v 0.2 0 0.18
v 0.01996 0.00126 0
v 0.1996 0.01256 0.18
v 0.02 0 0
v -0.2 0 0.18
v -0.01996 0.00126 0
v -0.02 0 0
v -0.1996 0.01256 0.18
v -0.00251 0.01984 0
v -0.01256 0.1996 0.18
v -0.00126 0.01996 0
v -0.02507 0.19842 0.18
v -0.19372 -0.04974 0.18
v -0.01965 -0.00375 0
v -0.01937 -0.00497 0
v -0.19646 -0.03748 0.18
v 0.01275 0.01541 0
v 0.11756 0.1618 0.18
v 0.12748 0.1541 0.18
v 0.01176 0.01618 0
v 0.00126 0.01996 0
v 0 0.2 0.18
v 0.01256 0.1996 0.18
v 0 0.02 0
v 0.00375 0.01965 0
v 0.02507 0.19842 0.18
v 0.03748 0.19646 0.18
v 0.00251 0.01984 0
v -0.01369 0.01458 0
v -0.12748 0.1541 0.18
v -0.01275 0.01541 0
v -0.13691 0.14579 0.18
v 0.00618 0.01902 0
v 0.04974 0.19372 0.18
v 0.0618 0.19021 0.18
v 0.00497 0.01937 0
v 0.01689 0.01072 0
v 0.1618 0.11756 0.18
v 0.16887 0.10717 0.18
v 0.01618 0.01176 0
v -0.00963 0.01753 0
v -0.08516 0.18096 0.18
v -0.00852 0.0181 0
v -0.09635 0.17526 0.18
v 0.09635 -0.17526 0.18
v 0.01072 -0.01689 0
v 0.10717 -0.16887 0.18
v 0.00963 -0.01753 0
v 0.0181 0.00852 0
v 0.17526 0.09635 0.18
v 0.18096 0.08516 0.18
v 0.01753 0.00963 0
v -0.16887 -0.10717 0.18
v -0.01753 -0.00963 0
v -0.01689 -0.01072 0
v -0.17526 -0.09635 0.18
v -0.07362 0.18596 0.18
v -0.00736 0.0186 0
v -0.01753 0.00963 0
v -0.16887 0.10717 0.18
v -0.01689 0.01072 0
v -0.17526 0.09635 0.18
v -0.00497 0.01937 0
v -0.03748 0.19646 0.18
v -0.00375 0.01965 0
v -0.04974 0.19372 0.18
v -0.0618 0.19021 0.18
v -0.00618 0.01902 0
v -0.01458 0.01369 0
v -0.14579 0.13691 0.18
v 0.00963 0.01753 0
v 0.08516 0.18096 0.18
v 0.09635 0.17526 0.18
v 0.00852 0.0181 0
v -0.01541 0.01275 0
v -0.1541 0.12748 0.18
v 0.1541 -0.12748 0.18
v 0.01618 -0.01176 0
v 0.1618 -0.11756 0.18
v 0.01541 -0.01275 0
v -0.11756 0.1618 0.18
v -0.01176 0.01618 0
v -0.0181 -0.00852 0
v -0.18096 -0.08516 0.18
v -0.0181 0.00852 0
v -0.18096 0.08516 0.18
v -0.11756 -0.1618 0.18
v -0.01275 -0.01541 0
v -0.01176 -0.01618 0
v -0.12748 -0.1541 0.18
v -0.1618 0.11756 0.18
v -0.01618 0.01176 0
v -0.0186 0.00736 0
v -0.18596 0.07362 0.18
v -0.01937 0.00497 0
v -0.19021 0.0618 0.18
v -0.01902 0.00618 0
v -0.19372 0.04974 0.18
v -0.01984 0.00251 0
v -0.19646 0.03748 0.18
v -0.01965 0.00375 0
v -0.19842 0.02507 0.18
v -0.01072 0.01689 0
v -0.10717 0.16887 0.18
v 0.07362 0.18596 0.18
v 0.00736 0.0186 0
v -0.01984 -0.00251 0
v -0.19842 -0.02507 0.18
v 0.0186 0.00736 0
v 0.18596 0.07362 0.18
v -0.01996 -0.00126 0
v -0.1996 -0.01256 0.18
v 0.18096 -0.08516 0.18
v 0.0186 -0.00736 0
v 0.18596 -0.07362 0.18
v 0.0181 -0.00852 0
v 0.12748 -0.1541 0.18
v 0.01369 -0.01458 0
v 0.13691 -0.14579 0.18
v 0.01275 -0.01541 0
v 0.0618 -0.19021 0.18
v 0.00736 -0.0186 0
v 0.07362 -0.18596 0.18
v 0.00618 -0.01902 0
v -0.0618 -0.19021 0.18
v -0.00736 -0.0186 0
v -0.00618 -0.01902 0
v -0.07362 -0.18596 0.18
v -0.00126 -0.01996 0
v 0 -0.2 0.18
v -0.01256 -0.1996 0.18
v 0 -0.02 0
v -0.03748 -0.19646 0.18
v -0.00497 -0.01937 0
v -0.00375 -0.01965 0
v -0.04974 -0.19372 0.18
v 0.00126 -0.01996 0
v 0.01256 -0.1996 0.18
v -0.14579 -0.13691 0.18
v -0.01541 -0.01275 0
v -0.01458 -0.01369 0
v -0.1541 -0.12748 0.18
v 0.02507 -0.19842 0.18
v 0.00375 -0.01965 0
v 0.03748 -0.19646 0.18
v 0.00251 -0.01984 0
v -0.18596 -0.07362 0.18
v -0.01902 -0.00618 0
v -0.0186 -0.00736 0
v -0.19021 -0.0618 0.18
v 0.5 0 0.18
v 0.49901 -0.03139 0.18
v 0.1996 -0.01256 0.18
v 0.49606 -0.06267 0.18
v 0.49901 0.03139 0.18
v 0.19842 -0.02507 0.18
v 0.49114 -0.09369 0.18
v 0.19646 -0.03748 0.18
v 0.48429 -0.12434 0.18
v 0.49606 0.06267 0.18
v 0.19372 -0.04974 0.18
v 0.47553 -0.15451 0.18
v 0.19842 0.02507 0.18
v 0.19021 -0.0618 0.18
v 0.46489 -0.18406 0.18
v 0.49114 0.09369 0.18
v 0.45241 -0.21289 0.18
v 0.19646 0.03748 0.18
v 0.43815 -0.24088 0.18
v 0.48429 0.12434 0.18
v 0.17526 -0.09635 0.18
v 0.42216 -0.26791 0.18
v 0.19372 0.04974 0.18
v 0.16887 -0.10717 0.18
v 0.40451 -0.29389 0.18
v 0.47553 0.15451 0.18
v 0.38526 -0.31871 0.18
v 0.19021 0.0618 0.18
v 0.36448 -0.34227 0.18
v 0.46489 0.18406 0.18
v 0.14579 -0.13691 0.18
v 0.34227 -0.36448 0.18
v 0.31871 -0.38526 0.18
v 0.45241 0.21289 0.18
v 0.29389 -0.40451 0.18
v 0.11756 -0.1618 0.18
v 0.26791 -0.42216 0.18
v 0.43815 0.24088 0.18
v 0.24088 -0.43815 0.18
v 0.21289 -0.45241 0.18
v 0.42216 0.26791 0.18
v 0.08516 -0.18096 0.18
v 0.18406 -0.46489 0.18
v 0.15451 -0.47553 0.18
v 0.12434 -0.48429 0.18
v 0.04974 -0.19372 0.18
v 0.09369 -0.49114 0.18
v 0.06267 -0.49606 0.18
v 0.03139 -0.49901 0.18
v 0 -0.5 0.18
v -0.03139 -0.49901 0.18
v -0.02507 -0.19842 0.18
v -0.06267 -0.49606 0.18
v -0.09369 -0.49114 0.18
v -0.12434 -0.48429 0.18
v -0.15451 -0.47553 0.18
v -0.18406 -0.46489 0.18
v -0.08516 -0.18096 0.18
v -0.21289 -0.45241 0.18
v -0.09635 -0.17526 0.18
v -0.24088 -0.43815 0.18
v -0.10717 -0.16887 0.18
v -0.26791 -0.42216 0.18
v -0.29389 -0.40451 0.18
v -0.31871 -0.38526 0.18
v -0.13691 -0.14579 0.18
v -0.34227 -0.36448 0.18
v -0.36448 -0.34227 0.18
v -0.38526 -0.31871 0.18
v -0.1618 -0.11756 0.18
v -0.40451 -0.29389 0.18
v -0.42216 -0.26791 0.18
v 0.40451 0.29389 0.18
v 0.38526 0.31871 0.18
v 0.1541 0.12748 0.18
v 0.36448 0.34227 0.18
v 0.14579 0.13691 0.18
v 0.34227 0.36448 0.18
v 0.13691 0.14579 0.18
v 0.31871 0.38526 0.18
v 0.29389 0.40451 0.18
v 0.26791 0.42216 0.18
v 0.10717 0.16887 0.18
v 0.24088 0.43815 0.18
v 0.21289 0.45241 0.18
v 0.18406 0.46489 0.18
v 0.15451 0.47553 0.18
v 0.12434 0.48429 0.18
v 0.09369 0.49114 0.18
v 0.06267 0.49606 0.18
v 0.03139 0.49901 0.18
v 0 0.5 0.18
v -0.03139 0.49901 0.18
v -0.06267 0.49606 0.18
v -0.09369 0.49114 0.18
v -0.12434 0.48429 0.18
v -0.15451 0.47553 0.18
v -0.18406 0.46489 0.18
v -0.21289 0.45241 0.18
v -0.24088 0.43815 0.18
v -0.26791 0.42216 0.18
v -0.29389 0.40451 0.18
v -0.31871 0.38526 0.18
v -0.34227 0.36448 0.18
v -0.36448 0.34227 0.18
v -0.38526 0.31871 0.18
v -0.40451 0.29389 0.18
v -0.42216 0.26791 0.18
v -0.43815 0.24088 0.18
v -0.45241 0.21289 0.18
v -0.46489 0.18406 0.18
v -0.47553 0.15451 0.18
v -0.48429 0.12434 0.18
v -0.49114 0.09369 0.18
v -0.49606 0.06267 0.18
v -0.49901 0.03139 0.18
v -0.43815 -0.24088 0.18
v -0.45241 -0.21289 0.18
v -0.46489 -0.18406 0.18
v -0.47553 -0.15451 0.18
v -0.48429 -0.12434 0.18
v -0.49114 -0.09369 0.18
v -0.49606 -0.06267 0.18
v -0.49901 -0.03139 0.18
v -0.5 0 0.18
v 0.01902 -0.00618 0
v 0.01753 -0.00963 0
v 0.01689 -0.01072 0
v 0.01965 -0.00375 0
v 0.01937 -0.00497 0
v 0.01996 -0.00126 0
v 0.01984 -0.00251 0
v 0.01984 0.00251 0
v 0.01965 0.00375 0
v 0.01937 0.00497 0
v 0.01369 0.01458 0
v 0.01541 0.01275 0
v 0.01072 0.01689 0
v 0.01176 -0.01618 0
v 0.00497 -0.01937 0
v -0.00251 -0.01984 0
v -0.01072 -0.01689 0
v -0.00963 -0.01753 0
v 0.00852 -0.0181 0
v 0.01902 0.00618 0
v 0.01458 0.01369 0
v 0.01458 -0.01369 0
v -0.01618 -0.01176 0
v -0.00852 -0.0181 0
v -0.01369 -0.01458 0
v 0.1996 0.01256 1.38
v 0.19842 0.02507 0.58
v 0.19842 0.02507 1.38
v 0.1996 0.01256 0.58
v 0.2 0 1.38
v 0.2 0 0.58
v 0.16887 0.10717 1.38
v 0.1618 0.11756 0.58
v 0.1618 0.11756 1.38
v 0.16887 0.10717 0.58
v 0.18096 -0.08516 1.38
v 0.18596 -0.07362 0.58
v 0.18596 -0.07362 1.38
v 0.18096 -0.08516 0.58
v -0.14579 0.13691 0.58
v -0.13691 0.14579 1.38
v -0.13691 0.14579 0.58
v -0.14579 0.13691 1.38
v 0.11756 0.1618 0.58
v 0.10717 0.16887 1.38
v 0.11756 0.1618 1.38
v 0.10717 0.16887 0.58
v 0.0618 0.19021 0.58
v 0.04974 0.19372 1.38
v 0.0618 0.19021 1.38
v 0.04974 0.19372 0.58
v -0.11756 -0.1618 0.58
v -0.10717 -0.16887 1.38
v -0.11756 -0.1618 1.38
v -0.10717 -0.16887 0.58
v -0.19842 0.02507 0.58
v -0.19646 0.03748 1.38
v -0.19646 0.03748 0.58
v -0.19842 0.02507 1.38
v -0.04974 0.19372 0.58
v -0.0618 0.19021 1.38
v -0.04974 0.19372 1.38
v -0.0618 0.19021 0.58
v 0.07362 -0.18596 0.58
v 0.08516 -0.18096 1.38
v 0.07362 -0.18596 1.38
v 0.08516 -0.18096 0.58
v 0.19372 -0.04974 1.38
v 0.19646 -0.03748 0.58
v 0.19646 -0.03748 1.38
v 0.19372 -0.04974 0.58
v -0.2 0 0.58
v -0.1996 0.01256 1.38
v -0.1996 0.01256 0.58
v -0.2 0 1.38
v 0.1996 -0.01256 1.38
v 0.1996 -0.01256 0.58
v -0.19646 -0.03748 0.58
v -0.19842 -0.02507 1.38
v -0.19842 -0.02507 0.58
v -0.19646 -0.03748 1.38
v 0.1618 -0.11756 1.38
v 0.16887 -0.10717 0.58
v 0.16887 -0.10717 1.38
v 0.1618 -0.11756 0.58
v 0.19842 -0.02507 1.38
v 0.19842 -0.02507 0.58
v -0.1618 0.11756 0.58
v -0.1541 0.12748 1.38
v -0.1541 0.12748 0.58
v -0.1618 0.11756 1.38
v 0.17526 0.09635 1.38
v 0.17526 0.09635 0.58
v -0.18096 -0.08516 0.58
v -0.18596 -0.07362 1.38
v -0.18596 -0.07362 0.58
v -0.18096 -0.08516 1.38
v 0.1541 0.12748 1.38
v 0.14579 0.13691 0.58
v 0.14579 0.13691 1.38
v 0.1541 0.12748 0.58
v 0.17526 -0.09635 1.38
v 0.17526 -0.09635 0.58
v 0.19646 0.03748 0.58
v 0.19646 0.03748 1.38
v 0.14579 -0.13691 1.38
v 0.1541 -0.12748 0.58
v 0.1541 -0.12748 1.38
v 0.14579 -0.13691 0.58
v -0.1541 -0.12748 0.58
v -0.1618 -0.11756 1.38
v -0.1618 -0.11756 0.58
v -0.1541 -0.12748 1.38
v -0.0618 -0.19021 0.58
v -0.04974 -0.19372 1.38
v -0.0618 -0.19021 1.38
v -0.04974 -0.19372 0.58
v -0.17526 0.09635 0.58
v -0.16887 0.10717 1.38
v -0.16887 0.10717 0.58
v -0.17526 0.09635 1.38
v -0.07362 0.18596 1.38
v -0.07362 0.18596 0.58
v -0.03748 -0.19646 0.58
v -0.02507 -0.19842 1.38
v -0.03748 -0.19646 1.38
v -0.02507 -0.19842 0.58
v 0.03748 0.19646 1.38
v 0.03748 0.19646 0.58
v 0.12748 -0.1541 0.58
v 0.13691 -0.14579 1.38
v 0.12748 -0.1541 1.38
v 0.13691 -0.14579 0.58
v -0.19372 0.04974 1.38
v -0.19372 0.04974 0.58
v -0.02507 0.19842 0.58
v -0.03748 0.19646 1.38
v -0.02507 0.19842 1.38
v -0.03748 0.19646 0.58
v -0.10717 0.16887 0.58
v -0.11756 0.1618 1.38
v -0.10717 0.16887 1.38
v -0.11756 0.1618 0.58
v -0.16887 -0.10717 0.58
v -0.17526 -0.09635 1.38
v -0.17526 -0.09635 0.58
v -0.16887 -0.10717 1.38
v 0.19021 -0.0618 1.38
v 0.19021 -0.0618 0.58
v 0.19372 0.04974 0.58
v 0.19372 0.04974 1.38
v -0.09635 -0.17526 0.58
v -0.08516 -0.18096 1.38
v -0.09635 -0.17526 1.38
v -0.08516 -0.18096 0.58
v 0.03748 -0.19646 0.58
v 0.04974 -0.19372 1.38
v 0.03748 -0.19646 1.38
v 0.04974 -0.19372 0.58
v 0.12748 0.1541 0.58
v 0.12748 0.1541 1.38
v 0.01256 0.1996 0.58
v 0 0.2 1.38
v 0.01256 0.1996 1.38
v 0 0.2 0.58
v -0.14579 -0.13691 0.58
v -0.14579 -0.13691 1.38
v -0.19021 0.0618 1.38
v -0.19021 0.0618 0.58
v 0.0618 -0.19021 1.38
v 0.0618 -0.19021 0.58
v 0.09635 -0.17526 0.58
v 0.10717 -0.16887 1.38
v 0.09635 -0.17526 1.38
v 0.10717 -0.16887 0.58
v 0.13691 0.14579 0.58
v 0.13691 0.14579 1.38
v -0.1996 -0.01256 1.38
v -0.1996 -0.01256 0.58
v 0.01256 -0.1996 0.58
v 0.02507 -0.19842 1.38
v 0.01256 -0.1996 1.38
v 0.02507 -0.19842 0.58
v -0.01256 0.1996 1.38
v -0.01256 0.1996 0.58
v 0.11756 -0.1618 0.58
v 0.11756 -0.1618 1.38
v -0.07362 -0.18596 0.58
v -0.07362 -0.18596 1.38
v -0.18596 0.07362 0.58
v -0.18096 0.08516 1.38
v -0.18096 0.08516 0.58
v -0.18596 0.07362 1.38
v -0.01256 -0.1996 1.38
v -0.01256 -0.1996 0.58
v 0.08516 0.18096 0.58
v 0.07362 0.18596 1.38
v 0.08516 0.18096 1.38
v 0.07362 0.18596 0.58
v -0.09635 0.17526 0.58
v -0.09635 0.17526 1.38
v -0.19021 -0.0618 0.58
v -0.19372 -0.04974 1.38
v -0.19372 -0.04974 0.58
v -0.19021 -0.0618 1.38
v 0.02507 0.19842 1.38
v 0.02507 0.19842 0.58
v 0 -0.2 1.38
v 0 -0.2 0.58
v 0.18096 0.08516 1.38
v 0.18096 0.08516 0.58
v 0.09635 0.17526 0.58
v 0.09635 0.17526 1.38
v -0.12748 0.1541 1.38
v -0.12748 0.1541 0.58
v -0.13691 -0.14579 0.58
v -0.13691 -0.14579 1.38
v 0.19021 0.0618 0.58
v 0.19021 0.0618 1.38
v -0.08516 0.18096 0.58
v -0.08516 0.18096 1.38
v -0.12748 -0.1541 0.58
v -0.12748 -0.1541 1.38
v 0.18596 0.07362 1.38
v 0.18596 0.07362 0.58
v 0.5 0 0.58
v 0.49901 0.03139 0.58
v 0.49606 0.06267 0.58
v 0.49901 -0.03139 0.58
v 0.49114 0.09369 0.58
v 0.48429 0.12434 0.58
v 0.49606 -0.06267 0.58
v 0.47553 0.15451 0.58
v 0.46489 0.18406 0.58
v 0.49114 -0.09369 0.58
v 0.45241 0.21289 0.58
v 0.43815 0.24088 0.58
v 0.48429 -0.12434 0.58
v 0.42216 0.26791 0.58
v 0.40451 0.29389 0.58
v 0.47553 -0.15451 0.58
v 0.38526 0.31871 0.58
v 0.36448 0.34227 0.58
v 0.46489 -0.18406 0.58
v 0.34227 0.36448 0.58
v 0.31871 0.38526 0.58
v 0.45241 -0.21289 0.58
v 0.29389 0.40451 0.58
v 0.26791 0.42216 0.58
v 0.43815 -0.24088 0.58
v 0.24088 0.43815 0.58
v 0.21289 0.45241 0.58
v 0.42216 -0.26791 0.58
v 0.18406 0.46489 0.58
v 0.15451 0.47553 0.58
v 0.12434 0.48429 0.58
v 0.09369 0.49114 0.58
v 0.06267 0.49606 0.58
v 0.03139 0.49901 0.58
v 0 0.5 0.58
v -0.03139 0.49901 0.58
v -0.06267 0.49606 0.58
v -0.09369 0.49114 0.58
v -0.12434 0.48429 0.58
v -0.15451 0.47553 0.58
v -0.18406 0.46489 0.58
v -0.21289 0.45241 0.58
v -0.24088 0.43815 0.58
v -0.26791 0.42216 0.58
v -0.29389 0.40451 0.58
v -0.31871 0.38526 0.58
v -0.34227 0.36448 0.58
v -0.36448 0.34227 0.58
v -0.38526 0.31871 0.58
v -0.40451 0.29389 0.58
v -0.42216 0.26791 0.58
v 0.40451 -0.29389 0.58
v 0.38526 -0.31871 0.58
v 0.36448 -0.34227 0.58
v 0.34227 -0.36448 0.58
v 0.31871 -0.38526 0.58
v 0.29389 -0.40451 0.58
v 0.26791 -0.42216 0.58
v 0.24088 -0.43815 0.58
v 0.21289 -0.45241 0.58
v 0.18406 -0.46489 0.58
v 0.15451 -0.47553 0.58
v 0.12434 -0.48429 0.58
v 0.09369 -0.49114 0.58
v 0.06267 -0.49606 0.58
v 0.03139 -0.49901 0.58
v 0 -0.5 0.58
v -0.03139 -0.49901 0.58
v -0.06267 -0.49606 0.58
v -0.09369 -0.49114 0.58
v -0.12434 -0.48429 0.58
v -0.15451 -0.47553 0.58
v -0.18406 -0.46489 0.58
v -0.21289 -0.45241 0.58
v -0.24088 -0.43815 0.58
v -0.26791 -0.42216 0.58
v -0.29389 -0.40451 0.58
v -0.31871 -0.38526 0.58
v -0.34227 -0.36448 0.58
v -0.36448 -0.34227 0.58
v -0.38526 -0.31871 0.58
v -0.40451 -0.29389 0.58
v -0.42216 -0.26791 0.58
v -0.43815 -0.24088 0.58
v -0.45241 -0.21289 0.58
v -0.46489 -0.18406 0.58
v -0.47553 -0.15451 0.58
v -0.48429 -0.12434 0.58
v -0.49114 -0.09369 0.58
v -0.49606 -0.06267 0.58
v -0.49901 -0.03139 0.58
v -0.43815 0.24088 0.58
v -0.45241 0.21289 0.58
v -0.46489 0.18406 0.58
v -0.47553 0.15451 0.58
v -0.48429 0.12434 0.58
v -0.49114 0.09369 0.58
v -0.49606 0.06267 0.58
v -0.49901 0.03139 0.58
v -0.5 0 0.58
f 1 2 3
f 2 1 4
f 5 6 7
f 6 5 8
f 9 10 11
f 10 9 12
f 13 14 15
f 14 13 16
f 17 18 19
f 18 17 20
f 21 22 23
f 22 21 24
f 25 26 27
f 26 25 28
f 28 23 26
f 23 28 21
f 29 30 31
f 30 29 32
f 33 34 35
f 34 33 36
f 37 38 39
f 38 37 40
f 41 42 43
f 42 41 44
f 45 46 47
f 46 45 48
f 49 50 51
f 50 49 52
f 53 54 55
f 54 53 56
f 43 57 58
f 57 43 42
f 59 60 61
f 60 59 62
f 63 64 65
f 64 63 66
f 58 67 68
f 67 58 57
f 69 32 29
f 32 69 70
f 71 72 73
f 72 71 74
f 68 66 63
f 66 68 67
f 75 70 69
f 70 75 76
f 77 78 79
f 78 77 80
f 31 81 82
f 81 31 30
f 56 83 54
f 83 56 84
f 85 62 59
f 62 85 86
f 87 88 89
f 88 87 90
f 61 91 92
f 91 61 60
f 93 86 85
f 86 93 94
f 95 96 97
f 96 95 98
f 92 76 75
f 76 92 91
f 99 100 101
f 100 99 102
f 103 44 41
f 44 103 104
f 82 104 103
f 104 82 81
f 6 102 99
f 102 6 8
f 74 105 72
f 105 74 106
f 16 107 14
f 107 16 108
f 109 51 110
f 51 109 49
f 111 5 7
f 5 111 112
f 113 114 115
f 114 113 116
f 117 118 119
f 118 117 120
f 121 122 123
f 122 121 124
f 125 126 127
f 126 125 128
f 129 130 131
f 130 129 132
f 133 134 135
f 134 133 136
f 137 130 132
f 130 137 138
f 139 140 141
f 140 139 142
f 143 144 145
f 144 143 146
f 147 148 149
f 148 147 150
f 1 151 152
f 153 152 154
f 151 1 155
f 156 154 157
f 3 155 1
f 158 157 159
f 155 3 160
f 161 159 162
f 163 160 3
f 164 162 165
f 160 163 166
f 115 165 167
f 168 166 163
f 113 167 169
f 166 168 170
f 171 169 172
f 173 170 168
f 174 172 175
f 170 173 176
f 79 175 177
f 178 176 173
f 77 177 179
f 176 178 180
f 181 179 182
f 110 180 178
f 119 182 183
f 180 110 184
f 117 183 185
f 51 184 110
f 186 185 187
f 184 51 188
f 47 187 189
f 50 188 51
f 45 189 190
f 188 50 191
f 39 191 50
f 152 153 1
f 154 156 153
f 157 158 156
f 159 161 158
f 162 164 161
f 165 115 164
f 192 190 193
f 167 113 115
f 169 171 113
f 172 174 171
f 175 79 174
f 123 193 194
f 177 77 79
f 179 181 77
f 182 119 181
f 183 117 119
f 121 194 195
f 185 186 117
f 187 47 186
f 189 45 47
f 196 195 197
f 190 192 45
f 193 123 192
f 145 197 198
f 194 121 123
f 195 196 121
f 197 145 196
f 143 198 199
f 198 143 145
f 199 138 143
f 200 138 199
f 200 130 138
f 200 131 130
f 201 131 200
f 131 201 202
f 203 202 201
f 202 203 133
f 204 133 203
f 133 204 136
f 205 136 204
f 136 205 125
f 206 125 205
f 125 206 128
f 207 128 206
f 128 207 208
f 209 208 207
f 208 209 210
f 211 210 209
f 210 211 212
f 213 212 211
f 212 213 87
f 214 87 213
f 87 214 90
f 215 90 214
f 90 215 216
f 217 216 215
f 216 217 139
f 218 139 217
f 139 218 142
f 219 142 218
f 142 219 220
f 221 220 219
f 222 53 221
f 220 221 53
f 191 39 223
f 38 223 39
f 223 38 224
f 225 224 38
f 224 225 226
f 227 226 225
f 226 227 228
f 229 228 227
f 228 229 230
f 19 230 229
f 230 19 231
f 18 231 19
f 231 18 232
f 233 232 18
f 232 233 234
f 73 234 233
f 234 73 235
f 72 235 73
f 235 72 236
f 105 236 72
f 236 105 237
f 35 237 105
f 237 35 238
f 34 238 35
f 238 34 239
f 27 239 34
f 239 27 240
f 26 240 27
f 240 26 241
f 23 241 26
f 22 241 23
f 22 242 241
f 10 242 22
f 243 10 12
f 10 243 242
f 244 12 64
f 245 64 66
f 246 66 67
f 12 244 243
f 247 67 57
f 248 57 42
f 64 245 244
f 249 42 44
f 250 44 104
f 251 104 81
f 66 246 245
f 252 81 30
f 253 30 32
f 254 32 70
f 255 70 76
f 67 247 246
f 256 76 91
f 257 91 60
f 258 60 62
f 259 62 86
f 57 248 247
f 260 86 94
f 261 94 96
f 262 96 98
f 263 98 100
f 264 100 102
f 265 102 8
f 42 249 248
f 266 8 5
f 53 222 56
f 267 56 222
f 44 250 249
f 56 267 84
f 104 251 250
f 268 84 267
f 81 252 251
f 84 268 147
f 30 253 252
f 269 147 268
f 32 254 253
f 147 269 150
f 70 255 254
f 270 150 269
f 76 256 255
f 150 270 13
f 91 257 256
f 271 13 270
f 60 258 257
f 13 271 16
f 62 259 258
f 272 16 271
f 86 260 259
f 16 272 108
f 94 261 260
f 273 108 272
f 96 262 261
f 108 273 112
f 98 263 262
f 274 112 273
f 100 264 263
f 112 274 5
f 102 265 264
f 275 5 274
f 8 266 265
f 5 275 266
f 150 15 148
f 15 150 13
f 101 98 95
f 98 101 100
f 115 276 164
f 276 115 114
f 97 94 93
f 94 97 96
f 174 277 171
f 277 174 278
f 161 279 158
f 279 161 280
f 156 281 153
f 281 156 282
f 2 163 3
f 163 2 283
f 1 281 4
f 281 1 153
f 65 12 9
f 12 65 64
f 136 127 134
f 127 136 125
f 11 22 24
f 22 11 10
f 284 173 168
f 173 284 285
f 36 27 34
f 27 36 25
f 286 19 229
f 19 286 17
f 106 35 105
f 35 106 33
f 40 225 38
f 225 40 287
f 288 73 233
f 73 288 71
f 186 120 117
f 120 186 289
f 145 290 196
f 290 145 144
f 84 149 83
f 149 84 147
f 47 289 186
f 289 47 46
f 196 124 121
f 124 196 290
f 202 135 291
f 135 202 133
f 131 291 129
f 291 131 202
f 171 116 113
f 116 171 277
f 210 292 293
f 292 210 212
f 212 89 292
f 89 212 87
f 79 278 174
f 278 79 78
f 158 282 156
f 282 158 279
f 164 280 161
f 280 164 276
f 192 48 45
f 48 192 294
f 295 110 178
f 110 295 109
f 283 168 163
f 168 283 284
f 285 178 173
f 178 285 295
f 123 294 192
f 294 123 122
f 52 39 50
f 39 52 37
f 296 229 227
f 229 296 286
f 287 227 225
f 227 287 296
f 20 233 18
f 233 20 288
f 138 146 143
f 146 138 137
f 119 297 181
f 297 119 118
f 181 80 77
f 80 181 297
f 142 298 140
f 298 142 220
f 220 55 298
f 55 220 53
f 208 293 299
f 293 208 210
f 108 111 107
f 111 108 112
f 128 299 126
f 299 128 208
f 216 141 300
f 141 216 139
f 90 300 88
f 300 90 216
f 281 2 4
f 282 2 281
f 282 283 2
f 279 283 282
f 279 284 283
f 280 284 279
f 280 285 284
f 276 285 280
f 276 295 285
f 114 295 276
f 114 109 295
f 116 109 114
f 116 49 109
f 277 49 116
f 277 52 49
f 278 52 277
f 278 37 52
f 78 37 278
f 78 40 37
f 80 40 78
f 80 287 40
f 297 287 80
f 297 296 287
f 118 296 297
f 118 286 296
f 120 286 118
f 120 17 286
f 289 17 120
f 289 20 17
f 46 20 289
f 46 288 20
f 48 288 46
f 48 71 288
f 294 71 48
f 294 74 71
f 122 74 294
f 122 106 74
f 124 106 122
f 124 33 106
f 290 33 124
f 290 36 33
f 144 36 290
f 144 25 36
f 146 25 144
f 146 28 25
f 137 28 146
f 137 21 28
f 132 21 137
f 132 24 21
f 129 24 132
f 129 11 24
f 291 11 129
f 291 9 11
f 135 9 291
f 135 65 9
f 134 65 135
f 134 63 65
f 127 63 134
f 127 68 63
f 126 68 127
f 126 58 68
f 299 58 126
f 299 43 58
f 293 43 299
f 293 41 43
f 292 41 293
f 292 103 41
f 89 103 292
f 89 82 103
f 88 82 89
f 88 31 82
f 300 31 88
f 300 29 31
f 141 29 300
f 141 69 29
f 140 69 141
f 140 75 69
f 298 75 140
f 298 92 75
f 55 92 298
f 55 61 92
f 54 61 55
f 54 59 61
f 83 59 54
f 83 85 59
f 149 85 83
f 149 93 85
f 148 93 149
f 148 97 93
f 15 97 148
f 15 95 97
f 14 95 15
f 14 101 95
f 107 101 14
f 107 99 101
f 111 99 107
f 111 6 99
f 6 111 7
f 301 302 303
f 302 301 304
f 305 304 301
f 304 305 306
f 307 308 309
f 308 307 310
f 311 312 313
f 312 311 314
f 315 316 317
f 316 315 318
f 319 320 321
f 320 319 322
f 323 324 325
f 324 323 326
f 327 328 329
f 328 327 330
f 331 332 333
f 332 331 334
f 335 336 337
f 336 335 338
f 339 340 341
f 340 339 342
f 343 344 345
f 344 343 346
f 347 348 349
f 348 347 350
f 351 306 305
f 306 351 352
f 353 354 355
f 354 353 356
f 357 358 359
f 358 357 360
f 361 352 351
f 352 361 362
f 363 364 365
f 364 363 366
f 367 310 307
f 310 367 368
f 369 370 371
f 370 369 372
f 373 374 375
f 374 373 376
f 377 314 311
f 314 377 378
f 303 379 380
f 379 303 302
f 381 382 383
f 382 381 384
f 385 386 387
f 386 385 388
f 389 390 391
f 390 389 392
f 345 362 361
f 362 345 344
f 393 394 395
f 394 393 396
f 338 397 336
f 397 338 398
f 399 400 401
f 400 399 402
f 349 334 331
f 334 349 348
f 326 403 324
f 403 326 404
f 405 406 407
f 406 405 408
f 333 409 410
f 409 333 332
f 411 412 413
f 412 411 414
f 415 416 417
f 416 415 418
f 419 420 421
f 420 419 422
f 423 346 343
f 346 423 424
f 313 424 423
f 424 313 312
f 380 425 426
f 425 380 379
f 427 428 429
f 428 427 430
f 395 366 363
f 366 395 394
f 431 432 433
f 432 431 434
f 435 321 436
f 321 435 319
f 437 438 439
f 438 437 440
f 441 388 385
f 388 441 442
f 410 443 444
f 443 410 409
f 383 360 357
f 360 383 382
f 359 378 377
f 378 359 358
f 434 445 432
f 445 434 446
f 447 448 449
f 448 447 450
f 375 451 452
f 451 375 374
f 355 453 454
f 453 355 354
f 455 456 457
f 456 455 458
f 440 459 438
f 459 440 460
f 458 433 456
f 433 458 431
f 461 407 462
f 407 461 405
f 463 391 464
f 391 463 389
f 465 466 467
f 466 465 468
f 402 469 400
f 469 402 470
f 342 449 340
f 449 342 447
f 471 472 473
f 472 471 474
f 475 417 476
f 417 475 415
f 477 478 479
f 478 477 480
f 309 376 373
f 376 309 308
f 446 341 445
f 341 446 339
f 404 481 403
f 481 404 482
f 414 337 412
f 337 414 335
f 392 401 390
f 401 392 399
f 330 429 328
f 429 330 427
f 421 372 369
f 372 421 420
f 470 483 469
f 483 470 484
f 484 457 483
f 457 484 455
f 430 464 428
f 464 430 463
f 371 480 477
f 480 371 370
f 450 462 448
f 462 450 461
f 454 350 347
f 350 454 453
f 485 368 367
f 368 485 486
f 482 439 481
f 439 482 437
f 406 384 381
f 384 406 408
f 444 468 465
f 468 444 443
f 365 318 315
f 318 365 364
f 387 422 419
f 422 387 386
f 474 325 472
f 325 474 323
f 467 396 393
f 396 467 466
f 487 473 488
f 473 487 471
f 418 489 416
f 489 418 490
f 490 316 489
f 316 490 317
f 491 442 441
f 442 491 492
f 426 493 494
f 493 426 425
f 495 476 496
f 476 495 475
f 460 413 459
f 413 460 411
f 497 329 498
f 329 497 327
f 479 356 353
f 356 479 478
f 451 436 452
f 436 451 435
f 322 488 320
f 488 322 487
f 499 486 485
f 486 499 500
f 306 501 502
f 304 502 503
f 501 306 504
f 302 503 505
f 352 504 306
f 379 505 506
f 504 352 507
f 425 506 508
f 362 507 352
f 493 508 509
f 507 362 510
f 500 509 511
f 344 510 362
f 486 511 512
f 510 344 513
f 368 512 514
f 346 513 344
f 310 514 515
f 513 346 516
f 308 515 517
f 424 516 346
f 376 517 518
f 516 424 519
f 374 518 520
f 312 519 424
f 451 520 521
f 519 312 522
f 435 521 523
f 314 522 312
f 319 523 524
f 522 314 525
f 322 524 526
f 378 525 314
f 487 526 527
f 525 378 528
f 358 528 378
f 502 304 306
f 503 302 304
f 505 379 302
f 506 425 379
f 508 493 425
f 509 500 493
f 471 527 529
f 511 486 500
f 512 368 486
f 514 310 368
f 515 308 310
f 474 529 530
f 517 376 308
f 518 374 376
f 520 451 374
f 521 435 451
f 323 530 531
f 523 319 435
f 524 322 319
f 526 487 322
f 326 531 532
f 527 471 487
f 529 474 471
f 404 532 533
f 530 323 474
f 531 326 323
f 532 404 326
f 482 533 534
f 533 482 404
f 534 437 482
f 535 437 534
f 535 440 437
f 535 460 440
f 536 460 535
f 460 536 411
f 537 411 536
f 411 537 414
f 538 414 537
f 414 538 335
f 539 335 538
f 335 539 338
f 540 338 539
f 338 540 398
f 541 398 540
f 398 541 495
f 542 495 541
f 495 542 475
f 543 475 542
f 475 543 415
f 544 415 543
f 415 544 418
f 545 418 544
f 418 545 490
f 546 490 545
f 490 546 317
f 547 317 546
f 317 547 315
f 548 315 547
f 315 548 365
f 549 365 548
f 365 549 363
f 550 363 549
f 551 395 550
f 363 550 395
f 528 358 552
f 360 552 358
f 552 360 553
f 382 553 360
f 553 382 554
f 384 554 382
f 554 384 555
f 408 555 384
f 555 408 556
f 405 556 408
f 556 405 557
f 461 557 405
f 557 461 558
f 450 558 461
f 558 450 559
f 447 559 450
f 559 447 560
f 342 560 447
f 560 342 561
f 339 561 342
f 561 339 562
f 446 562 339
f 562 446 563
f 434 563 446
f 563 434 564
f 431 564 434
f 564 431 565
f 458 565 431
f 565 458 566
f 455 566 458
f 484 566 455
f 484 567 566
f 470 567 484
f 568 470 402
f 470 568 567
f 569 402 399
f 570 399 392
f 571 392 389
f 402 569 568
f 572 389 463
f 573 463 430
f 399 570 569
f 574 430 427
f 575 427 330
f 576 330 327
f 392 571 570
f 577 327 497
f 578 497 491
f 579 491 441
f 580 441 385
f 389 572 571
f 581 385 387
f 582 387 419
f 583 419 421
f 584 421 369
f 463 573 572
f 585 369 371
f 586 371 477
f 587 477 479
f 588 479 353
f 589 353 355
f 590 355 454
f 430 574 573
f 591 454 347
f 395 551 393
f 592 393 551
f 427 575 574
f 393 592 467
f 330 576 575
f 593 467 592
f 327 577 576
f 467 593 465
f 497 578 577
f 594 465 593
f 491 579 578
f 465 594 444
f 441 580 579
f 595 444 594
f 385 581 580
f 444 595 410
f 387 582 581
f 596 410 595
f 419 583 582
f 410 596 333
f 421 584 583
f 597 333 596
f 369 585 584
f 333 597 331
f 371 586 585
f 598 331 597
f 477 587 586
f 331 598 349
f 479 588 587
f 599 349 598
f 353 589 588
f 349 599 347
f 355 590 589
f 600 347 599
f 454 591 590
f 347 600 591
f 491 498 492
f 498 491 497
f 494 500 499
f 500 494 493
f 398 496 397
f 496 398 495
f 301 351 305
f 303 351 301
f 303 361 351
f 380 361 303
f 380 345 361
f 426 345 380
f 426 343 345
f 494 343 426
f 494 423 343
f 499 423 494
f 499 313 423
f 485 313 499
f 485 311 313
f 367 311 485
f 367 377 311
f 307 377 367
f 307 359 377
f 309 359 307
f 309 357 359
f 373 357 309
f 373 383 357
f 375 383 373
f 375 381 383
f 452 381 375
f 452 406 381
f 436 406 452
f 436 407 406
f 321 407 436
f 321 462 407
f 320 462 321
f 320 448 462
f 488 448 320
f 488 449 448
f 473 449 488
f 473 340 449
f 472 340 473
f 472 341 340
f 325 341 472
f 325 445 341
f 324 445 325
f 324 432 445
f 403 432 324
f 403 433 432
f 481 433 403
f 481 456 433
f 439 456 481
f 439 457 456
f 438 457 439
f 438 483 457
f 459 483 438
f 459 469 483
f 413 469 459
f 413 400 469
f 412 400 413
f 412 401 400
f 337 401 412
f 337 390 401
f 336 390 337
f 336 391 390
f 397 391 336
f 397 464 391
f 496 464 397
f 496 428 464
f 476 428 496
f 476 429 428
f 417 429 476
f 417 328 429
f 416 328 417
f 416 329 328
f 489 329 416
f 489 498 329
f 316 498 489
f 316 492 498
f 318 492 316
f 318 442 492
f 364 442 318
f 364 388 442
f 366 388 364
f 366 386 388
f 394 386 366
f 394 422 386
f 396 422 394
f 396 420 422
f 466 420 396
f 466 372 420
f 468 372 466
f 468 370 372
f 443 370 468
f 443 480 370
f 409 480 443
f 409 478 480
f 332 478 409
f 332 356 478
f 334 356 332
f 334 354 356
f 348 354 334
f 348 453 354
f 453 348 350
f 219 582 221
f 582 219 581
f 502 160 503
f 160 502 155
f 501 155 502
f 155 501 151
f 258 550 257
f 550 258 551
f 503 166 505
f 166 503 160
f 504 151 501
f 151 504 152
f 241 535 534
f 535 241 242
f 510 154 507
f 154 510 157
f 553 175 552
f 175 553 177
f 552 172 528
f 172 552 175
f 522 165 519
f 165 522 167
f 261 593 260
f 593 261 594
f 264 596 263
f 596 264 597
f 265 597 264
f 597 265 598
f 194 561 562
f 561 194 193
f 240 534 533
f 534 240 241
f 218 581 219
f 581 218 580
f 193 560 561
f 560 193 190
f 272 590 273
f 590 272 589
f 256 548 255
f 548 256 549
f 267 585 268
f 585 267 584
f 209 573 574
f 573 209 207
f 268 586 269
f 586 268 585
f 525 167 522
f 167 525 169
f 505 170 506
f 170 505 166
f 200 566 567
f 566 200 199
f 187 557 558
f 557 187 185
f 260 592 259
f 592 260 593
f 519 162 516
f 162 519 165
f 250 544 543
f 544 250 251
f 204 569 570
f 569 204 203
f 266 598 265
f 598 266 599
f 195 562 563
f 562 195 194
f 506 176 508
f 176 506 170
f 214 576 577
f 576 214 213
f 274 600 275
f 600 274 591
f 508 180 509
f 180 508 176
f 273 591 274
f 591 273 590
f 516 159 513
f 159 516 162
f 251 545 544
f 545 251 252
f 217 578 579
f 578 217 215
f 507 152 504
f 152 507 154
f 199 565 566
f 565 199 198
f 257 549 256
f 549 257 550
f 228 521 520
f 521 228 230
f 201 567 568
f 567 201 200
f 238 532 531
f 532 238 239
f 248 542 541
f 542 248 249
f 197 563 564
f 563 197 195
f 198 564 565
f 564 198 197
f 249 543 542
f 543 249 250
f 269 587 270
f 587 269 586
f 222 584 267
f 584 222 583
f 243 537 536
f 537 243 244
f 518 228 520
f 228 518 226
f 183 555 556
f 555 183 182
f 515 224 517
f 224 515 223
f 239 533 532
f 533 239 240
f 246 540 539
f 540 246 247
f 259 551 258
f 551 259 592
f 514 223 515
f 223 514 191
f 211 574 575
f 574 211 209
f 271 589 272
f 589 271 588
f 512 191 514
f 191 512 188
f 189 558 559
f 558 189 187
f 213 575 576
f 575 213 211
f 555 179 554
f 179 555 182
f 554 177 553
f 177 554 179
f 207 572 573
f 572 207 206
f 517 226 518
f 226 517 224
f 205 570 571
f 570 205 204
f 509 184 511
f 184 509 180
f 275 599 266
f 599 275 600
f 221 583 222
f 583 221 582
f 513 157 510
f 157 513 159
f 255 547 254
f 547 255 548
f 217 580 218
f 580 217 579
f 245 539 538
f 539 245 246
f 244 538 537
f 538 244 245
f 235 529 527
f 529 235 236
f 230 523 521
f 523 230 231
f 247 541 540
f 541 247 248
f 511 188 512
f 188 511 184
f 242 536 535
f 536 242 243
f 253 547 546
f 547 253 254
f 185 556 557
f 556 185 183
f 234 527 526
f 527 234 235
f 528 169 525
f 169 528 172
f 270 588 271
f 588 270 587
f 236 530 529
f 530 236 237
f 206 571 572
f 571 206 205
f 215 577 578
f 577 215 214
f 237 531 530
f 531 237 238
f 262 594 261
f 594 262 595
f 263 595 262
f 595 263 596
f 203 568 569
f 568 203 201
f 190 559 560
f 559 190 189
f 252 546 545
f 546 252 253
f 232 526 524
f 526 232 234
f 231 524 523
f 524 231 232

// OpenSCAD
resolution = 100;

body_ra = 0.5;
body_thickness = 0.4;

cone_height = 0.2;
cone_base_rad = 0.2;
bevel_height = 0.02;

axis_radius = 0.2;
axis_height = 0.8;


module axis(radius)
{
    translate(v=[0,0,cone_height+body_thickness])
    linear_extrude(axis_height, center = false)
    circle(axis_radius, $fn = resolution);
}

module body()
{
    translate(v=[0,0,cone_height])
    linear_extrude(body_thickness, center = false)
    circle(body_ra, $fn = resolution);
}

module cone()
{
    cylinder(r1=0, r2=cone_base_rad, h=cone_height, $fn = resolution, center = false);
}

module top()
{
    translate(v=[0,0,-bevel_height])
    {
        
            axis(axis_radius);
            body();
            difference()
            {
                cone();
                linear_extrude(bevel_height, center = false)
                    circle(cone_base_rad, $fn = resolution, center = true);
            }
        
    }
}

top();
